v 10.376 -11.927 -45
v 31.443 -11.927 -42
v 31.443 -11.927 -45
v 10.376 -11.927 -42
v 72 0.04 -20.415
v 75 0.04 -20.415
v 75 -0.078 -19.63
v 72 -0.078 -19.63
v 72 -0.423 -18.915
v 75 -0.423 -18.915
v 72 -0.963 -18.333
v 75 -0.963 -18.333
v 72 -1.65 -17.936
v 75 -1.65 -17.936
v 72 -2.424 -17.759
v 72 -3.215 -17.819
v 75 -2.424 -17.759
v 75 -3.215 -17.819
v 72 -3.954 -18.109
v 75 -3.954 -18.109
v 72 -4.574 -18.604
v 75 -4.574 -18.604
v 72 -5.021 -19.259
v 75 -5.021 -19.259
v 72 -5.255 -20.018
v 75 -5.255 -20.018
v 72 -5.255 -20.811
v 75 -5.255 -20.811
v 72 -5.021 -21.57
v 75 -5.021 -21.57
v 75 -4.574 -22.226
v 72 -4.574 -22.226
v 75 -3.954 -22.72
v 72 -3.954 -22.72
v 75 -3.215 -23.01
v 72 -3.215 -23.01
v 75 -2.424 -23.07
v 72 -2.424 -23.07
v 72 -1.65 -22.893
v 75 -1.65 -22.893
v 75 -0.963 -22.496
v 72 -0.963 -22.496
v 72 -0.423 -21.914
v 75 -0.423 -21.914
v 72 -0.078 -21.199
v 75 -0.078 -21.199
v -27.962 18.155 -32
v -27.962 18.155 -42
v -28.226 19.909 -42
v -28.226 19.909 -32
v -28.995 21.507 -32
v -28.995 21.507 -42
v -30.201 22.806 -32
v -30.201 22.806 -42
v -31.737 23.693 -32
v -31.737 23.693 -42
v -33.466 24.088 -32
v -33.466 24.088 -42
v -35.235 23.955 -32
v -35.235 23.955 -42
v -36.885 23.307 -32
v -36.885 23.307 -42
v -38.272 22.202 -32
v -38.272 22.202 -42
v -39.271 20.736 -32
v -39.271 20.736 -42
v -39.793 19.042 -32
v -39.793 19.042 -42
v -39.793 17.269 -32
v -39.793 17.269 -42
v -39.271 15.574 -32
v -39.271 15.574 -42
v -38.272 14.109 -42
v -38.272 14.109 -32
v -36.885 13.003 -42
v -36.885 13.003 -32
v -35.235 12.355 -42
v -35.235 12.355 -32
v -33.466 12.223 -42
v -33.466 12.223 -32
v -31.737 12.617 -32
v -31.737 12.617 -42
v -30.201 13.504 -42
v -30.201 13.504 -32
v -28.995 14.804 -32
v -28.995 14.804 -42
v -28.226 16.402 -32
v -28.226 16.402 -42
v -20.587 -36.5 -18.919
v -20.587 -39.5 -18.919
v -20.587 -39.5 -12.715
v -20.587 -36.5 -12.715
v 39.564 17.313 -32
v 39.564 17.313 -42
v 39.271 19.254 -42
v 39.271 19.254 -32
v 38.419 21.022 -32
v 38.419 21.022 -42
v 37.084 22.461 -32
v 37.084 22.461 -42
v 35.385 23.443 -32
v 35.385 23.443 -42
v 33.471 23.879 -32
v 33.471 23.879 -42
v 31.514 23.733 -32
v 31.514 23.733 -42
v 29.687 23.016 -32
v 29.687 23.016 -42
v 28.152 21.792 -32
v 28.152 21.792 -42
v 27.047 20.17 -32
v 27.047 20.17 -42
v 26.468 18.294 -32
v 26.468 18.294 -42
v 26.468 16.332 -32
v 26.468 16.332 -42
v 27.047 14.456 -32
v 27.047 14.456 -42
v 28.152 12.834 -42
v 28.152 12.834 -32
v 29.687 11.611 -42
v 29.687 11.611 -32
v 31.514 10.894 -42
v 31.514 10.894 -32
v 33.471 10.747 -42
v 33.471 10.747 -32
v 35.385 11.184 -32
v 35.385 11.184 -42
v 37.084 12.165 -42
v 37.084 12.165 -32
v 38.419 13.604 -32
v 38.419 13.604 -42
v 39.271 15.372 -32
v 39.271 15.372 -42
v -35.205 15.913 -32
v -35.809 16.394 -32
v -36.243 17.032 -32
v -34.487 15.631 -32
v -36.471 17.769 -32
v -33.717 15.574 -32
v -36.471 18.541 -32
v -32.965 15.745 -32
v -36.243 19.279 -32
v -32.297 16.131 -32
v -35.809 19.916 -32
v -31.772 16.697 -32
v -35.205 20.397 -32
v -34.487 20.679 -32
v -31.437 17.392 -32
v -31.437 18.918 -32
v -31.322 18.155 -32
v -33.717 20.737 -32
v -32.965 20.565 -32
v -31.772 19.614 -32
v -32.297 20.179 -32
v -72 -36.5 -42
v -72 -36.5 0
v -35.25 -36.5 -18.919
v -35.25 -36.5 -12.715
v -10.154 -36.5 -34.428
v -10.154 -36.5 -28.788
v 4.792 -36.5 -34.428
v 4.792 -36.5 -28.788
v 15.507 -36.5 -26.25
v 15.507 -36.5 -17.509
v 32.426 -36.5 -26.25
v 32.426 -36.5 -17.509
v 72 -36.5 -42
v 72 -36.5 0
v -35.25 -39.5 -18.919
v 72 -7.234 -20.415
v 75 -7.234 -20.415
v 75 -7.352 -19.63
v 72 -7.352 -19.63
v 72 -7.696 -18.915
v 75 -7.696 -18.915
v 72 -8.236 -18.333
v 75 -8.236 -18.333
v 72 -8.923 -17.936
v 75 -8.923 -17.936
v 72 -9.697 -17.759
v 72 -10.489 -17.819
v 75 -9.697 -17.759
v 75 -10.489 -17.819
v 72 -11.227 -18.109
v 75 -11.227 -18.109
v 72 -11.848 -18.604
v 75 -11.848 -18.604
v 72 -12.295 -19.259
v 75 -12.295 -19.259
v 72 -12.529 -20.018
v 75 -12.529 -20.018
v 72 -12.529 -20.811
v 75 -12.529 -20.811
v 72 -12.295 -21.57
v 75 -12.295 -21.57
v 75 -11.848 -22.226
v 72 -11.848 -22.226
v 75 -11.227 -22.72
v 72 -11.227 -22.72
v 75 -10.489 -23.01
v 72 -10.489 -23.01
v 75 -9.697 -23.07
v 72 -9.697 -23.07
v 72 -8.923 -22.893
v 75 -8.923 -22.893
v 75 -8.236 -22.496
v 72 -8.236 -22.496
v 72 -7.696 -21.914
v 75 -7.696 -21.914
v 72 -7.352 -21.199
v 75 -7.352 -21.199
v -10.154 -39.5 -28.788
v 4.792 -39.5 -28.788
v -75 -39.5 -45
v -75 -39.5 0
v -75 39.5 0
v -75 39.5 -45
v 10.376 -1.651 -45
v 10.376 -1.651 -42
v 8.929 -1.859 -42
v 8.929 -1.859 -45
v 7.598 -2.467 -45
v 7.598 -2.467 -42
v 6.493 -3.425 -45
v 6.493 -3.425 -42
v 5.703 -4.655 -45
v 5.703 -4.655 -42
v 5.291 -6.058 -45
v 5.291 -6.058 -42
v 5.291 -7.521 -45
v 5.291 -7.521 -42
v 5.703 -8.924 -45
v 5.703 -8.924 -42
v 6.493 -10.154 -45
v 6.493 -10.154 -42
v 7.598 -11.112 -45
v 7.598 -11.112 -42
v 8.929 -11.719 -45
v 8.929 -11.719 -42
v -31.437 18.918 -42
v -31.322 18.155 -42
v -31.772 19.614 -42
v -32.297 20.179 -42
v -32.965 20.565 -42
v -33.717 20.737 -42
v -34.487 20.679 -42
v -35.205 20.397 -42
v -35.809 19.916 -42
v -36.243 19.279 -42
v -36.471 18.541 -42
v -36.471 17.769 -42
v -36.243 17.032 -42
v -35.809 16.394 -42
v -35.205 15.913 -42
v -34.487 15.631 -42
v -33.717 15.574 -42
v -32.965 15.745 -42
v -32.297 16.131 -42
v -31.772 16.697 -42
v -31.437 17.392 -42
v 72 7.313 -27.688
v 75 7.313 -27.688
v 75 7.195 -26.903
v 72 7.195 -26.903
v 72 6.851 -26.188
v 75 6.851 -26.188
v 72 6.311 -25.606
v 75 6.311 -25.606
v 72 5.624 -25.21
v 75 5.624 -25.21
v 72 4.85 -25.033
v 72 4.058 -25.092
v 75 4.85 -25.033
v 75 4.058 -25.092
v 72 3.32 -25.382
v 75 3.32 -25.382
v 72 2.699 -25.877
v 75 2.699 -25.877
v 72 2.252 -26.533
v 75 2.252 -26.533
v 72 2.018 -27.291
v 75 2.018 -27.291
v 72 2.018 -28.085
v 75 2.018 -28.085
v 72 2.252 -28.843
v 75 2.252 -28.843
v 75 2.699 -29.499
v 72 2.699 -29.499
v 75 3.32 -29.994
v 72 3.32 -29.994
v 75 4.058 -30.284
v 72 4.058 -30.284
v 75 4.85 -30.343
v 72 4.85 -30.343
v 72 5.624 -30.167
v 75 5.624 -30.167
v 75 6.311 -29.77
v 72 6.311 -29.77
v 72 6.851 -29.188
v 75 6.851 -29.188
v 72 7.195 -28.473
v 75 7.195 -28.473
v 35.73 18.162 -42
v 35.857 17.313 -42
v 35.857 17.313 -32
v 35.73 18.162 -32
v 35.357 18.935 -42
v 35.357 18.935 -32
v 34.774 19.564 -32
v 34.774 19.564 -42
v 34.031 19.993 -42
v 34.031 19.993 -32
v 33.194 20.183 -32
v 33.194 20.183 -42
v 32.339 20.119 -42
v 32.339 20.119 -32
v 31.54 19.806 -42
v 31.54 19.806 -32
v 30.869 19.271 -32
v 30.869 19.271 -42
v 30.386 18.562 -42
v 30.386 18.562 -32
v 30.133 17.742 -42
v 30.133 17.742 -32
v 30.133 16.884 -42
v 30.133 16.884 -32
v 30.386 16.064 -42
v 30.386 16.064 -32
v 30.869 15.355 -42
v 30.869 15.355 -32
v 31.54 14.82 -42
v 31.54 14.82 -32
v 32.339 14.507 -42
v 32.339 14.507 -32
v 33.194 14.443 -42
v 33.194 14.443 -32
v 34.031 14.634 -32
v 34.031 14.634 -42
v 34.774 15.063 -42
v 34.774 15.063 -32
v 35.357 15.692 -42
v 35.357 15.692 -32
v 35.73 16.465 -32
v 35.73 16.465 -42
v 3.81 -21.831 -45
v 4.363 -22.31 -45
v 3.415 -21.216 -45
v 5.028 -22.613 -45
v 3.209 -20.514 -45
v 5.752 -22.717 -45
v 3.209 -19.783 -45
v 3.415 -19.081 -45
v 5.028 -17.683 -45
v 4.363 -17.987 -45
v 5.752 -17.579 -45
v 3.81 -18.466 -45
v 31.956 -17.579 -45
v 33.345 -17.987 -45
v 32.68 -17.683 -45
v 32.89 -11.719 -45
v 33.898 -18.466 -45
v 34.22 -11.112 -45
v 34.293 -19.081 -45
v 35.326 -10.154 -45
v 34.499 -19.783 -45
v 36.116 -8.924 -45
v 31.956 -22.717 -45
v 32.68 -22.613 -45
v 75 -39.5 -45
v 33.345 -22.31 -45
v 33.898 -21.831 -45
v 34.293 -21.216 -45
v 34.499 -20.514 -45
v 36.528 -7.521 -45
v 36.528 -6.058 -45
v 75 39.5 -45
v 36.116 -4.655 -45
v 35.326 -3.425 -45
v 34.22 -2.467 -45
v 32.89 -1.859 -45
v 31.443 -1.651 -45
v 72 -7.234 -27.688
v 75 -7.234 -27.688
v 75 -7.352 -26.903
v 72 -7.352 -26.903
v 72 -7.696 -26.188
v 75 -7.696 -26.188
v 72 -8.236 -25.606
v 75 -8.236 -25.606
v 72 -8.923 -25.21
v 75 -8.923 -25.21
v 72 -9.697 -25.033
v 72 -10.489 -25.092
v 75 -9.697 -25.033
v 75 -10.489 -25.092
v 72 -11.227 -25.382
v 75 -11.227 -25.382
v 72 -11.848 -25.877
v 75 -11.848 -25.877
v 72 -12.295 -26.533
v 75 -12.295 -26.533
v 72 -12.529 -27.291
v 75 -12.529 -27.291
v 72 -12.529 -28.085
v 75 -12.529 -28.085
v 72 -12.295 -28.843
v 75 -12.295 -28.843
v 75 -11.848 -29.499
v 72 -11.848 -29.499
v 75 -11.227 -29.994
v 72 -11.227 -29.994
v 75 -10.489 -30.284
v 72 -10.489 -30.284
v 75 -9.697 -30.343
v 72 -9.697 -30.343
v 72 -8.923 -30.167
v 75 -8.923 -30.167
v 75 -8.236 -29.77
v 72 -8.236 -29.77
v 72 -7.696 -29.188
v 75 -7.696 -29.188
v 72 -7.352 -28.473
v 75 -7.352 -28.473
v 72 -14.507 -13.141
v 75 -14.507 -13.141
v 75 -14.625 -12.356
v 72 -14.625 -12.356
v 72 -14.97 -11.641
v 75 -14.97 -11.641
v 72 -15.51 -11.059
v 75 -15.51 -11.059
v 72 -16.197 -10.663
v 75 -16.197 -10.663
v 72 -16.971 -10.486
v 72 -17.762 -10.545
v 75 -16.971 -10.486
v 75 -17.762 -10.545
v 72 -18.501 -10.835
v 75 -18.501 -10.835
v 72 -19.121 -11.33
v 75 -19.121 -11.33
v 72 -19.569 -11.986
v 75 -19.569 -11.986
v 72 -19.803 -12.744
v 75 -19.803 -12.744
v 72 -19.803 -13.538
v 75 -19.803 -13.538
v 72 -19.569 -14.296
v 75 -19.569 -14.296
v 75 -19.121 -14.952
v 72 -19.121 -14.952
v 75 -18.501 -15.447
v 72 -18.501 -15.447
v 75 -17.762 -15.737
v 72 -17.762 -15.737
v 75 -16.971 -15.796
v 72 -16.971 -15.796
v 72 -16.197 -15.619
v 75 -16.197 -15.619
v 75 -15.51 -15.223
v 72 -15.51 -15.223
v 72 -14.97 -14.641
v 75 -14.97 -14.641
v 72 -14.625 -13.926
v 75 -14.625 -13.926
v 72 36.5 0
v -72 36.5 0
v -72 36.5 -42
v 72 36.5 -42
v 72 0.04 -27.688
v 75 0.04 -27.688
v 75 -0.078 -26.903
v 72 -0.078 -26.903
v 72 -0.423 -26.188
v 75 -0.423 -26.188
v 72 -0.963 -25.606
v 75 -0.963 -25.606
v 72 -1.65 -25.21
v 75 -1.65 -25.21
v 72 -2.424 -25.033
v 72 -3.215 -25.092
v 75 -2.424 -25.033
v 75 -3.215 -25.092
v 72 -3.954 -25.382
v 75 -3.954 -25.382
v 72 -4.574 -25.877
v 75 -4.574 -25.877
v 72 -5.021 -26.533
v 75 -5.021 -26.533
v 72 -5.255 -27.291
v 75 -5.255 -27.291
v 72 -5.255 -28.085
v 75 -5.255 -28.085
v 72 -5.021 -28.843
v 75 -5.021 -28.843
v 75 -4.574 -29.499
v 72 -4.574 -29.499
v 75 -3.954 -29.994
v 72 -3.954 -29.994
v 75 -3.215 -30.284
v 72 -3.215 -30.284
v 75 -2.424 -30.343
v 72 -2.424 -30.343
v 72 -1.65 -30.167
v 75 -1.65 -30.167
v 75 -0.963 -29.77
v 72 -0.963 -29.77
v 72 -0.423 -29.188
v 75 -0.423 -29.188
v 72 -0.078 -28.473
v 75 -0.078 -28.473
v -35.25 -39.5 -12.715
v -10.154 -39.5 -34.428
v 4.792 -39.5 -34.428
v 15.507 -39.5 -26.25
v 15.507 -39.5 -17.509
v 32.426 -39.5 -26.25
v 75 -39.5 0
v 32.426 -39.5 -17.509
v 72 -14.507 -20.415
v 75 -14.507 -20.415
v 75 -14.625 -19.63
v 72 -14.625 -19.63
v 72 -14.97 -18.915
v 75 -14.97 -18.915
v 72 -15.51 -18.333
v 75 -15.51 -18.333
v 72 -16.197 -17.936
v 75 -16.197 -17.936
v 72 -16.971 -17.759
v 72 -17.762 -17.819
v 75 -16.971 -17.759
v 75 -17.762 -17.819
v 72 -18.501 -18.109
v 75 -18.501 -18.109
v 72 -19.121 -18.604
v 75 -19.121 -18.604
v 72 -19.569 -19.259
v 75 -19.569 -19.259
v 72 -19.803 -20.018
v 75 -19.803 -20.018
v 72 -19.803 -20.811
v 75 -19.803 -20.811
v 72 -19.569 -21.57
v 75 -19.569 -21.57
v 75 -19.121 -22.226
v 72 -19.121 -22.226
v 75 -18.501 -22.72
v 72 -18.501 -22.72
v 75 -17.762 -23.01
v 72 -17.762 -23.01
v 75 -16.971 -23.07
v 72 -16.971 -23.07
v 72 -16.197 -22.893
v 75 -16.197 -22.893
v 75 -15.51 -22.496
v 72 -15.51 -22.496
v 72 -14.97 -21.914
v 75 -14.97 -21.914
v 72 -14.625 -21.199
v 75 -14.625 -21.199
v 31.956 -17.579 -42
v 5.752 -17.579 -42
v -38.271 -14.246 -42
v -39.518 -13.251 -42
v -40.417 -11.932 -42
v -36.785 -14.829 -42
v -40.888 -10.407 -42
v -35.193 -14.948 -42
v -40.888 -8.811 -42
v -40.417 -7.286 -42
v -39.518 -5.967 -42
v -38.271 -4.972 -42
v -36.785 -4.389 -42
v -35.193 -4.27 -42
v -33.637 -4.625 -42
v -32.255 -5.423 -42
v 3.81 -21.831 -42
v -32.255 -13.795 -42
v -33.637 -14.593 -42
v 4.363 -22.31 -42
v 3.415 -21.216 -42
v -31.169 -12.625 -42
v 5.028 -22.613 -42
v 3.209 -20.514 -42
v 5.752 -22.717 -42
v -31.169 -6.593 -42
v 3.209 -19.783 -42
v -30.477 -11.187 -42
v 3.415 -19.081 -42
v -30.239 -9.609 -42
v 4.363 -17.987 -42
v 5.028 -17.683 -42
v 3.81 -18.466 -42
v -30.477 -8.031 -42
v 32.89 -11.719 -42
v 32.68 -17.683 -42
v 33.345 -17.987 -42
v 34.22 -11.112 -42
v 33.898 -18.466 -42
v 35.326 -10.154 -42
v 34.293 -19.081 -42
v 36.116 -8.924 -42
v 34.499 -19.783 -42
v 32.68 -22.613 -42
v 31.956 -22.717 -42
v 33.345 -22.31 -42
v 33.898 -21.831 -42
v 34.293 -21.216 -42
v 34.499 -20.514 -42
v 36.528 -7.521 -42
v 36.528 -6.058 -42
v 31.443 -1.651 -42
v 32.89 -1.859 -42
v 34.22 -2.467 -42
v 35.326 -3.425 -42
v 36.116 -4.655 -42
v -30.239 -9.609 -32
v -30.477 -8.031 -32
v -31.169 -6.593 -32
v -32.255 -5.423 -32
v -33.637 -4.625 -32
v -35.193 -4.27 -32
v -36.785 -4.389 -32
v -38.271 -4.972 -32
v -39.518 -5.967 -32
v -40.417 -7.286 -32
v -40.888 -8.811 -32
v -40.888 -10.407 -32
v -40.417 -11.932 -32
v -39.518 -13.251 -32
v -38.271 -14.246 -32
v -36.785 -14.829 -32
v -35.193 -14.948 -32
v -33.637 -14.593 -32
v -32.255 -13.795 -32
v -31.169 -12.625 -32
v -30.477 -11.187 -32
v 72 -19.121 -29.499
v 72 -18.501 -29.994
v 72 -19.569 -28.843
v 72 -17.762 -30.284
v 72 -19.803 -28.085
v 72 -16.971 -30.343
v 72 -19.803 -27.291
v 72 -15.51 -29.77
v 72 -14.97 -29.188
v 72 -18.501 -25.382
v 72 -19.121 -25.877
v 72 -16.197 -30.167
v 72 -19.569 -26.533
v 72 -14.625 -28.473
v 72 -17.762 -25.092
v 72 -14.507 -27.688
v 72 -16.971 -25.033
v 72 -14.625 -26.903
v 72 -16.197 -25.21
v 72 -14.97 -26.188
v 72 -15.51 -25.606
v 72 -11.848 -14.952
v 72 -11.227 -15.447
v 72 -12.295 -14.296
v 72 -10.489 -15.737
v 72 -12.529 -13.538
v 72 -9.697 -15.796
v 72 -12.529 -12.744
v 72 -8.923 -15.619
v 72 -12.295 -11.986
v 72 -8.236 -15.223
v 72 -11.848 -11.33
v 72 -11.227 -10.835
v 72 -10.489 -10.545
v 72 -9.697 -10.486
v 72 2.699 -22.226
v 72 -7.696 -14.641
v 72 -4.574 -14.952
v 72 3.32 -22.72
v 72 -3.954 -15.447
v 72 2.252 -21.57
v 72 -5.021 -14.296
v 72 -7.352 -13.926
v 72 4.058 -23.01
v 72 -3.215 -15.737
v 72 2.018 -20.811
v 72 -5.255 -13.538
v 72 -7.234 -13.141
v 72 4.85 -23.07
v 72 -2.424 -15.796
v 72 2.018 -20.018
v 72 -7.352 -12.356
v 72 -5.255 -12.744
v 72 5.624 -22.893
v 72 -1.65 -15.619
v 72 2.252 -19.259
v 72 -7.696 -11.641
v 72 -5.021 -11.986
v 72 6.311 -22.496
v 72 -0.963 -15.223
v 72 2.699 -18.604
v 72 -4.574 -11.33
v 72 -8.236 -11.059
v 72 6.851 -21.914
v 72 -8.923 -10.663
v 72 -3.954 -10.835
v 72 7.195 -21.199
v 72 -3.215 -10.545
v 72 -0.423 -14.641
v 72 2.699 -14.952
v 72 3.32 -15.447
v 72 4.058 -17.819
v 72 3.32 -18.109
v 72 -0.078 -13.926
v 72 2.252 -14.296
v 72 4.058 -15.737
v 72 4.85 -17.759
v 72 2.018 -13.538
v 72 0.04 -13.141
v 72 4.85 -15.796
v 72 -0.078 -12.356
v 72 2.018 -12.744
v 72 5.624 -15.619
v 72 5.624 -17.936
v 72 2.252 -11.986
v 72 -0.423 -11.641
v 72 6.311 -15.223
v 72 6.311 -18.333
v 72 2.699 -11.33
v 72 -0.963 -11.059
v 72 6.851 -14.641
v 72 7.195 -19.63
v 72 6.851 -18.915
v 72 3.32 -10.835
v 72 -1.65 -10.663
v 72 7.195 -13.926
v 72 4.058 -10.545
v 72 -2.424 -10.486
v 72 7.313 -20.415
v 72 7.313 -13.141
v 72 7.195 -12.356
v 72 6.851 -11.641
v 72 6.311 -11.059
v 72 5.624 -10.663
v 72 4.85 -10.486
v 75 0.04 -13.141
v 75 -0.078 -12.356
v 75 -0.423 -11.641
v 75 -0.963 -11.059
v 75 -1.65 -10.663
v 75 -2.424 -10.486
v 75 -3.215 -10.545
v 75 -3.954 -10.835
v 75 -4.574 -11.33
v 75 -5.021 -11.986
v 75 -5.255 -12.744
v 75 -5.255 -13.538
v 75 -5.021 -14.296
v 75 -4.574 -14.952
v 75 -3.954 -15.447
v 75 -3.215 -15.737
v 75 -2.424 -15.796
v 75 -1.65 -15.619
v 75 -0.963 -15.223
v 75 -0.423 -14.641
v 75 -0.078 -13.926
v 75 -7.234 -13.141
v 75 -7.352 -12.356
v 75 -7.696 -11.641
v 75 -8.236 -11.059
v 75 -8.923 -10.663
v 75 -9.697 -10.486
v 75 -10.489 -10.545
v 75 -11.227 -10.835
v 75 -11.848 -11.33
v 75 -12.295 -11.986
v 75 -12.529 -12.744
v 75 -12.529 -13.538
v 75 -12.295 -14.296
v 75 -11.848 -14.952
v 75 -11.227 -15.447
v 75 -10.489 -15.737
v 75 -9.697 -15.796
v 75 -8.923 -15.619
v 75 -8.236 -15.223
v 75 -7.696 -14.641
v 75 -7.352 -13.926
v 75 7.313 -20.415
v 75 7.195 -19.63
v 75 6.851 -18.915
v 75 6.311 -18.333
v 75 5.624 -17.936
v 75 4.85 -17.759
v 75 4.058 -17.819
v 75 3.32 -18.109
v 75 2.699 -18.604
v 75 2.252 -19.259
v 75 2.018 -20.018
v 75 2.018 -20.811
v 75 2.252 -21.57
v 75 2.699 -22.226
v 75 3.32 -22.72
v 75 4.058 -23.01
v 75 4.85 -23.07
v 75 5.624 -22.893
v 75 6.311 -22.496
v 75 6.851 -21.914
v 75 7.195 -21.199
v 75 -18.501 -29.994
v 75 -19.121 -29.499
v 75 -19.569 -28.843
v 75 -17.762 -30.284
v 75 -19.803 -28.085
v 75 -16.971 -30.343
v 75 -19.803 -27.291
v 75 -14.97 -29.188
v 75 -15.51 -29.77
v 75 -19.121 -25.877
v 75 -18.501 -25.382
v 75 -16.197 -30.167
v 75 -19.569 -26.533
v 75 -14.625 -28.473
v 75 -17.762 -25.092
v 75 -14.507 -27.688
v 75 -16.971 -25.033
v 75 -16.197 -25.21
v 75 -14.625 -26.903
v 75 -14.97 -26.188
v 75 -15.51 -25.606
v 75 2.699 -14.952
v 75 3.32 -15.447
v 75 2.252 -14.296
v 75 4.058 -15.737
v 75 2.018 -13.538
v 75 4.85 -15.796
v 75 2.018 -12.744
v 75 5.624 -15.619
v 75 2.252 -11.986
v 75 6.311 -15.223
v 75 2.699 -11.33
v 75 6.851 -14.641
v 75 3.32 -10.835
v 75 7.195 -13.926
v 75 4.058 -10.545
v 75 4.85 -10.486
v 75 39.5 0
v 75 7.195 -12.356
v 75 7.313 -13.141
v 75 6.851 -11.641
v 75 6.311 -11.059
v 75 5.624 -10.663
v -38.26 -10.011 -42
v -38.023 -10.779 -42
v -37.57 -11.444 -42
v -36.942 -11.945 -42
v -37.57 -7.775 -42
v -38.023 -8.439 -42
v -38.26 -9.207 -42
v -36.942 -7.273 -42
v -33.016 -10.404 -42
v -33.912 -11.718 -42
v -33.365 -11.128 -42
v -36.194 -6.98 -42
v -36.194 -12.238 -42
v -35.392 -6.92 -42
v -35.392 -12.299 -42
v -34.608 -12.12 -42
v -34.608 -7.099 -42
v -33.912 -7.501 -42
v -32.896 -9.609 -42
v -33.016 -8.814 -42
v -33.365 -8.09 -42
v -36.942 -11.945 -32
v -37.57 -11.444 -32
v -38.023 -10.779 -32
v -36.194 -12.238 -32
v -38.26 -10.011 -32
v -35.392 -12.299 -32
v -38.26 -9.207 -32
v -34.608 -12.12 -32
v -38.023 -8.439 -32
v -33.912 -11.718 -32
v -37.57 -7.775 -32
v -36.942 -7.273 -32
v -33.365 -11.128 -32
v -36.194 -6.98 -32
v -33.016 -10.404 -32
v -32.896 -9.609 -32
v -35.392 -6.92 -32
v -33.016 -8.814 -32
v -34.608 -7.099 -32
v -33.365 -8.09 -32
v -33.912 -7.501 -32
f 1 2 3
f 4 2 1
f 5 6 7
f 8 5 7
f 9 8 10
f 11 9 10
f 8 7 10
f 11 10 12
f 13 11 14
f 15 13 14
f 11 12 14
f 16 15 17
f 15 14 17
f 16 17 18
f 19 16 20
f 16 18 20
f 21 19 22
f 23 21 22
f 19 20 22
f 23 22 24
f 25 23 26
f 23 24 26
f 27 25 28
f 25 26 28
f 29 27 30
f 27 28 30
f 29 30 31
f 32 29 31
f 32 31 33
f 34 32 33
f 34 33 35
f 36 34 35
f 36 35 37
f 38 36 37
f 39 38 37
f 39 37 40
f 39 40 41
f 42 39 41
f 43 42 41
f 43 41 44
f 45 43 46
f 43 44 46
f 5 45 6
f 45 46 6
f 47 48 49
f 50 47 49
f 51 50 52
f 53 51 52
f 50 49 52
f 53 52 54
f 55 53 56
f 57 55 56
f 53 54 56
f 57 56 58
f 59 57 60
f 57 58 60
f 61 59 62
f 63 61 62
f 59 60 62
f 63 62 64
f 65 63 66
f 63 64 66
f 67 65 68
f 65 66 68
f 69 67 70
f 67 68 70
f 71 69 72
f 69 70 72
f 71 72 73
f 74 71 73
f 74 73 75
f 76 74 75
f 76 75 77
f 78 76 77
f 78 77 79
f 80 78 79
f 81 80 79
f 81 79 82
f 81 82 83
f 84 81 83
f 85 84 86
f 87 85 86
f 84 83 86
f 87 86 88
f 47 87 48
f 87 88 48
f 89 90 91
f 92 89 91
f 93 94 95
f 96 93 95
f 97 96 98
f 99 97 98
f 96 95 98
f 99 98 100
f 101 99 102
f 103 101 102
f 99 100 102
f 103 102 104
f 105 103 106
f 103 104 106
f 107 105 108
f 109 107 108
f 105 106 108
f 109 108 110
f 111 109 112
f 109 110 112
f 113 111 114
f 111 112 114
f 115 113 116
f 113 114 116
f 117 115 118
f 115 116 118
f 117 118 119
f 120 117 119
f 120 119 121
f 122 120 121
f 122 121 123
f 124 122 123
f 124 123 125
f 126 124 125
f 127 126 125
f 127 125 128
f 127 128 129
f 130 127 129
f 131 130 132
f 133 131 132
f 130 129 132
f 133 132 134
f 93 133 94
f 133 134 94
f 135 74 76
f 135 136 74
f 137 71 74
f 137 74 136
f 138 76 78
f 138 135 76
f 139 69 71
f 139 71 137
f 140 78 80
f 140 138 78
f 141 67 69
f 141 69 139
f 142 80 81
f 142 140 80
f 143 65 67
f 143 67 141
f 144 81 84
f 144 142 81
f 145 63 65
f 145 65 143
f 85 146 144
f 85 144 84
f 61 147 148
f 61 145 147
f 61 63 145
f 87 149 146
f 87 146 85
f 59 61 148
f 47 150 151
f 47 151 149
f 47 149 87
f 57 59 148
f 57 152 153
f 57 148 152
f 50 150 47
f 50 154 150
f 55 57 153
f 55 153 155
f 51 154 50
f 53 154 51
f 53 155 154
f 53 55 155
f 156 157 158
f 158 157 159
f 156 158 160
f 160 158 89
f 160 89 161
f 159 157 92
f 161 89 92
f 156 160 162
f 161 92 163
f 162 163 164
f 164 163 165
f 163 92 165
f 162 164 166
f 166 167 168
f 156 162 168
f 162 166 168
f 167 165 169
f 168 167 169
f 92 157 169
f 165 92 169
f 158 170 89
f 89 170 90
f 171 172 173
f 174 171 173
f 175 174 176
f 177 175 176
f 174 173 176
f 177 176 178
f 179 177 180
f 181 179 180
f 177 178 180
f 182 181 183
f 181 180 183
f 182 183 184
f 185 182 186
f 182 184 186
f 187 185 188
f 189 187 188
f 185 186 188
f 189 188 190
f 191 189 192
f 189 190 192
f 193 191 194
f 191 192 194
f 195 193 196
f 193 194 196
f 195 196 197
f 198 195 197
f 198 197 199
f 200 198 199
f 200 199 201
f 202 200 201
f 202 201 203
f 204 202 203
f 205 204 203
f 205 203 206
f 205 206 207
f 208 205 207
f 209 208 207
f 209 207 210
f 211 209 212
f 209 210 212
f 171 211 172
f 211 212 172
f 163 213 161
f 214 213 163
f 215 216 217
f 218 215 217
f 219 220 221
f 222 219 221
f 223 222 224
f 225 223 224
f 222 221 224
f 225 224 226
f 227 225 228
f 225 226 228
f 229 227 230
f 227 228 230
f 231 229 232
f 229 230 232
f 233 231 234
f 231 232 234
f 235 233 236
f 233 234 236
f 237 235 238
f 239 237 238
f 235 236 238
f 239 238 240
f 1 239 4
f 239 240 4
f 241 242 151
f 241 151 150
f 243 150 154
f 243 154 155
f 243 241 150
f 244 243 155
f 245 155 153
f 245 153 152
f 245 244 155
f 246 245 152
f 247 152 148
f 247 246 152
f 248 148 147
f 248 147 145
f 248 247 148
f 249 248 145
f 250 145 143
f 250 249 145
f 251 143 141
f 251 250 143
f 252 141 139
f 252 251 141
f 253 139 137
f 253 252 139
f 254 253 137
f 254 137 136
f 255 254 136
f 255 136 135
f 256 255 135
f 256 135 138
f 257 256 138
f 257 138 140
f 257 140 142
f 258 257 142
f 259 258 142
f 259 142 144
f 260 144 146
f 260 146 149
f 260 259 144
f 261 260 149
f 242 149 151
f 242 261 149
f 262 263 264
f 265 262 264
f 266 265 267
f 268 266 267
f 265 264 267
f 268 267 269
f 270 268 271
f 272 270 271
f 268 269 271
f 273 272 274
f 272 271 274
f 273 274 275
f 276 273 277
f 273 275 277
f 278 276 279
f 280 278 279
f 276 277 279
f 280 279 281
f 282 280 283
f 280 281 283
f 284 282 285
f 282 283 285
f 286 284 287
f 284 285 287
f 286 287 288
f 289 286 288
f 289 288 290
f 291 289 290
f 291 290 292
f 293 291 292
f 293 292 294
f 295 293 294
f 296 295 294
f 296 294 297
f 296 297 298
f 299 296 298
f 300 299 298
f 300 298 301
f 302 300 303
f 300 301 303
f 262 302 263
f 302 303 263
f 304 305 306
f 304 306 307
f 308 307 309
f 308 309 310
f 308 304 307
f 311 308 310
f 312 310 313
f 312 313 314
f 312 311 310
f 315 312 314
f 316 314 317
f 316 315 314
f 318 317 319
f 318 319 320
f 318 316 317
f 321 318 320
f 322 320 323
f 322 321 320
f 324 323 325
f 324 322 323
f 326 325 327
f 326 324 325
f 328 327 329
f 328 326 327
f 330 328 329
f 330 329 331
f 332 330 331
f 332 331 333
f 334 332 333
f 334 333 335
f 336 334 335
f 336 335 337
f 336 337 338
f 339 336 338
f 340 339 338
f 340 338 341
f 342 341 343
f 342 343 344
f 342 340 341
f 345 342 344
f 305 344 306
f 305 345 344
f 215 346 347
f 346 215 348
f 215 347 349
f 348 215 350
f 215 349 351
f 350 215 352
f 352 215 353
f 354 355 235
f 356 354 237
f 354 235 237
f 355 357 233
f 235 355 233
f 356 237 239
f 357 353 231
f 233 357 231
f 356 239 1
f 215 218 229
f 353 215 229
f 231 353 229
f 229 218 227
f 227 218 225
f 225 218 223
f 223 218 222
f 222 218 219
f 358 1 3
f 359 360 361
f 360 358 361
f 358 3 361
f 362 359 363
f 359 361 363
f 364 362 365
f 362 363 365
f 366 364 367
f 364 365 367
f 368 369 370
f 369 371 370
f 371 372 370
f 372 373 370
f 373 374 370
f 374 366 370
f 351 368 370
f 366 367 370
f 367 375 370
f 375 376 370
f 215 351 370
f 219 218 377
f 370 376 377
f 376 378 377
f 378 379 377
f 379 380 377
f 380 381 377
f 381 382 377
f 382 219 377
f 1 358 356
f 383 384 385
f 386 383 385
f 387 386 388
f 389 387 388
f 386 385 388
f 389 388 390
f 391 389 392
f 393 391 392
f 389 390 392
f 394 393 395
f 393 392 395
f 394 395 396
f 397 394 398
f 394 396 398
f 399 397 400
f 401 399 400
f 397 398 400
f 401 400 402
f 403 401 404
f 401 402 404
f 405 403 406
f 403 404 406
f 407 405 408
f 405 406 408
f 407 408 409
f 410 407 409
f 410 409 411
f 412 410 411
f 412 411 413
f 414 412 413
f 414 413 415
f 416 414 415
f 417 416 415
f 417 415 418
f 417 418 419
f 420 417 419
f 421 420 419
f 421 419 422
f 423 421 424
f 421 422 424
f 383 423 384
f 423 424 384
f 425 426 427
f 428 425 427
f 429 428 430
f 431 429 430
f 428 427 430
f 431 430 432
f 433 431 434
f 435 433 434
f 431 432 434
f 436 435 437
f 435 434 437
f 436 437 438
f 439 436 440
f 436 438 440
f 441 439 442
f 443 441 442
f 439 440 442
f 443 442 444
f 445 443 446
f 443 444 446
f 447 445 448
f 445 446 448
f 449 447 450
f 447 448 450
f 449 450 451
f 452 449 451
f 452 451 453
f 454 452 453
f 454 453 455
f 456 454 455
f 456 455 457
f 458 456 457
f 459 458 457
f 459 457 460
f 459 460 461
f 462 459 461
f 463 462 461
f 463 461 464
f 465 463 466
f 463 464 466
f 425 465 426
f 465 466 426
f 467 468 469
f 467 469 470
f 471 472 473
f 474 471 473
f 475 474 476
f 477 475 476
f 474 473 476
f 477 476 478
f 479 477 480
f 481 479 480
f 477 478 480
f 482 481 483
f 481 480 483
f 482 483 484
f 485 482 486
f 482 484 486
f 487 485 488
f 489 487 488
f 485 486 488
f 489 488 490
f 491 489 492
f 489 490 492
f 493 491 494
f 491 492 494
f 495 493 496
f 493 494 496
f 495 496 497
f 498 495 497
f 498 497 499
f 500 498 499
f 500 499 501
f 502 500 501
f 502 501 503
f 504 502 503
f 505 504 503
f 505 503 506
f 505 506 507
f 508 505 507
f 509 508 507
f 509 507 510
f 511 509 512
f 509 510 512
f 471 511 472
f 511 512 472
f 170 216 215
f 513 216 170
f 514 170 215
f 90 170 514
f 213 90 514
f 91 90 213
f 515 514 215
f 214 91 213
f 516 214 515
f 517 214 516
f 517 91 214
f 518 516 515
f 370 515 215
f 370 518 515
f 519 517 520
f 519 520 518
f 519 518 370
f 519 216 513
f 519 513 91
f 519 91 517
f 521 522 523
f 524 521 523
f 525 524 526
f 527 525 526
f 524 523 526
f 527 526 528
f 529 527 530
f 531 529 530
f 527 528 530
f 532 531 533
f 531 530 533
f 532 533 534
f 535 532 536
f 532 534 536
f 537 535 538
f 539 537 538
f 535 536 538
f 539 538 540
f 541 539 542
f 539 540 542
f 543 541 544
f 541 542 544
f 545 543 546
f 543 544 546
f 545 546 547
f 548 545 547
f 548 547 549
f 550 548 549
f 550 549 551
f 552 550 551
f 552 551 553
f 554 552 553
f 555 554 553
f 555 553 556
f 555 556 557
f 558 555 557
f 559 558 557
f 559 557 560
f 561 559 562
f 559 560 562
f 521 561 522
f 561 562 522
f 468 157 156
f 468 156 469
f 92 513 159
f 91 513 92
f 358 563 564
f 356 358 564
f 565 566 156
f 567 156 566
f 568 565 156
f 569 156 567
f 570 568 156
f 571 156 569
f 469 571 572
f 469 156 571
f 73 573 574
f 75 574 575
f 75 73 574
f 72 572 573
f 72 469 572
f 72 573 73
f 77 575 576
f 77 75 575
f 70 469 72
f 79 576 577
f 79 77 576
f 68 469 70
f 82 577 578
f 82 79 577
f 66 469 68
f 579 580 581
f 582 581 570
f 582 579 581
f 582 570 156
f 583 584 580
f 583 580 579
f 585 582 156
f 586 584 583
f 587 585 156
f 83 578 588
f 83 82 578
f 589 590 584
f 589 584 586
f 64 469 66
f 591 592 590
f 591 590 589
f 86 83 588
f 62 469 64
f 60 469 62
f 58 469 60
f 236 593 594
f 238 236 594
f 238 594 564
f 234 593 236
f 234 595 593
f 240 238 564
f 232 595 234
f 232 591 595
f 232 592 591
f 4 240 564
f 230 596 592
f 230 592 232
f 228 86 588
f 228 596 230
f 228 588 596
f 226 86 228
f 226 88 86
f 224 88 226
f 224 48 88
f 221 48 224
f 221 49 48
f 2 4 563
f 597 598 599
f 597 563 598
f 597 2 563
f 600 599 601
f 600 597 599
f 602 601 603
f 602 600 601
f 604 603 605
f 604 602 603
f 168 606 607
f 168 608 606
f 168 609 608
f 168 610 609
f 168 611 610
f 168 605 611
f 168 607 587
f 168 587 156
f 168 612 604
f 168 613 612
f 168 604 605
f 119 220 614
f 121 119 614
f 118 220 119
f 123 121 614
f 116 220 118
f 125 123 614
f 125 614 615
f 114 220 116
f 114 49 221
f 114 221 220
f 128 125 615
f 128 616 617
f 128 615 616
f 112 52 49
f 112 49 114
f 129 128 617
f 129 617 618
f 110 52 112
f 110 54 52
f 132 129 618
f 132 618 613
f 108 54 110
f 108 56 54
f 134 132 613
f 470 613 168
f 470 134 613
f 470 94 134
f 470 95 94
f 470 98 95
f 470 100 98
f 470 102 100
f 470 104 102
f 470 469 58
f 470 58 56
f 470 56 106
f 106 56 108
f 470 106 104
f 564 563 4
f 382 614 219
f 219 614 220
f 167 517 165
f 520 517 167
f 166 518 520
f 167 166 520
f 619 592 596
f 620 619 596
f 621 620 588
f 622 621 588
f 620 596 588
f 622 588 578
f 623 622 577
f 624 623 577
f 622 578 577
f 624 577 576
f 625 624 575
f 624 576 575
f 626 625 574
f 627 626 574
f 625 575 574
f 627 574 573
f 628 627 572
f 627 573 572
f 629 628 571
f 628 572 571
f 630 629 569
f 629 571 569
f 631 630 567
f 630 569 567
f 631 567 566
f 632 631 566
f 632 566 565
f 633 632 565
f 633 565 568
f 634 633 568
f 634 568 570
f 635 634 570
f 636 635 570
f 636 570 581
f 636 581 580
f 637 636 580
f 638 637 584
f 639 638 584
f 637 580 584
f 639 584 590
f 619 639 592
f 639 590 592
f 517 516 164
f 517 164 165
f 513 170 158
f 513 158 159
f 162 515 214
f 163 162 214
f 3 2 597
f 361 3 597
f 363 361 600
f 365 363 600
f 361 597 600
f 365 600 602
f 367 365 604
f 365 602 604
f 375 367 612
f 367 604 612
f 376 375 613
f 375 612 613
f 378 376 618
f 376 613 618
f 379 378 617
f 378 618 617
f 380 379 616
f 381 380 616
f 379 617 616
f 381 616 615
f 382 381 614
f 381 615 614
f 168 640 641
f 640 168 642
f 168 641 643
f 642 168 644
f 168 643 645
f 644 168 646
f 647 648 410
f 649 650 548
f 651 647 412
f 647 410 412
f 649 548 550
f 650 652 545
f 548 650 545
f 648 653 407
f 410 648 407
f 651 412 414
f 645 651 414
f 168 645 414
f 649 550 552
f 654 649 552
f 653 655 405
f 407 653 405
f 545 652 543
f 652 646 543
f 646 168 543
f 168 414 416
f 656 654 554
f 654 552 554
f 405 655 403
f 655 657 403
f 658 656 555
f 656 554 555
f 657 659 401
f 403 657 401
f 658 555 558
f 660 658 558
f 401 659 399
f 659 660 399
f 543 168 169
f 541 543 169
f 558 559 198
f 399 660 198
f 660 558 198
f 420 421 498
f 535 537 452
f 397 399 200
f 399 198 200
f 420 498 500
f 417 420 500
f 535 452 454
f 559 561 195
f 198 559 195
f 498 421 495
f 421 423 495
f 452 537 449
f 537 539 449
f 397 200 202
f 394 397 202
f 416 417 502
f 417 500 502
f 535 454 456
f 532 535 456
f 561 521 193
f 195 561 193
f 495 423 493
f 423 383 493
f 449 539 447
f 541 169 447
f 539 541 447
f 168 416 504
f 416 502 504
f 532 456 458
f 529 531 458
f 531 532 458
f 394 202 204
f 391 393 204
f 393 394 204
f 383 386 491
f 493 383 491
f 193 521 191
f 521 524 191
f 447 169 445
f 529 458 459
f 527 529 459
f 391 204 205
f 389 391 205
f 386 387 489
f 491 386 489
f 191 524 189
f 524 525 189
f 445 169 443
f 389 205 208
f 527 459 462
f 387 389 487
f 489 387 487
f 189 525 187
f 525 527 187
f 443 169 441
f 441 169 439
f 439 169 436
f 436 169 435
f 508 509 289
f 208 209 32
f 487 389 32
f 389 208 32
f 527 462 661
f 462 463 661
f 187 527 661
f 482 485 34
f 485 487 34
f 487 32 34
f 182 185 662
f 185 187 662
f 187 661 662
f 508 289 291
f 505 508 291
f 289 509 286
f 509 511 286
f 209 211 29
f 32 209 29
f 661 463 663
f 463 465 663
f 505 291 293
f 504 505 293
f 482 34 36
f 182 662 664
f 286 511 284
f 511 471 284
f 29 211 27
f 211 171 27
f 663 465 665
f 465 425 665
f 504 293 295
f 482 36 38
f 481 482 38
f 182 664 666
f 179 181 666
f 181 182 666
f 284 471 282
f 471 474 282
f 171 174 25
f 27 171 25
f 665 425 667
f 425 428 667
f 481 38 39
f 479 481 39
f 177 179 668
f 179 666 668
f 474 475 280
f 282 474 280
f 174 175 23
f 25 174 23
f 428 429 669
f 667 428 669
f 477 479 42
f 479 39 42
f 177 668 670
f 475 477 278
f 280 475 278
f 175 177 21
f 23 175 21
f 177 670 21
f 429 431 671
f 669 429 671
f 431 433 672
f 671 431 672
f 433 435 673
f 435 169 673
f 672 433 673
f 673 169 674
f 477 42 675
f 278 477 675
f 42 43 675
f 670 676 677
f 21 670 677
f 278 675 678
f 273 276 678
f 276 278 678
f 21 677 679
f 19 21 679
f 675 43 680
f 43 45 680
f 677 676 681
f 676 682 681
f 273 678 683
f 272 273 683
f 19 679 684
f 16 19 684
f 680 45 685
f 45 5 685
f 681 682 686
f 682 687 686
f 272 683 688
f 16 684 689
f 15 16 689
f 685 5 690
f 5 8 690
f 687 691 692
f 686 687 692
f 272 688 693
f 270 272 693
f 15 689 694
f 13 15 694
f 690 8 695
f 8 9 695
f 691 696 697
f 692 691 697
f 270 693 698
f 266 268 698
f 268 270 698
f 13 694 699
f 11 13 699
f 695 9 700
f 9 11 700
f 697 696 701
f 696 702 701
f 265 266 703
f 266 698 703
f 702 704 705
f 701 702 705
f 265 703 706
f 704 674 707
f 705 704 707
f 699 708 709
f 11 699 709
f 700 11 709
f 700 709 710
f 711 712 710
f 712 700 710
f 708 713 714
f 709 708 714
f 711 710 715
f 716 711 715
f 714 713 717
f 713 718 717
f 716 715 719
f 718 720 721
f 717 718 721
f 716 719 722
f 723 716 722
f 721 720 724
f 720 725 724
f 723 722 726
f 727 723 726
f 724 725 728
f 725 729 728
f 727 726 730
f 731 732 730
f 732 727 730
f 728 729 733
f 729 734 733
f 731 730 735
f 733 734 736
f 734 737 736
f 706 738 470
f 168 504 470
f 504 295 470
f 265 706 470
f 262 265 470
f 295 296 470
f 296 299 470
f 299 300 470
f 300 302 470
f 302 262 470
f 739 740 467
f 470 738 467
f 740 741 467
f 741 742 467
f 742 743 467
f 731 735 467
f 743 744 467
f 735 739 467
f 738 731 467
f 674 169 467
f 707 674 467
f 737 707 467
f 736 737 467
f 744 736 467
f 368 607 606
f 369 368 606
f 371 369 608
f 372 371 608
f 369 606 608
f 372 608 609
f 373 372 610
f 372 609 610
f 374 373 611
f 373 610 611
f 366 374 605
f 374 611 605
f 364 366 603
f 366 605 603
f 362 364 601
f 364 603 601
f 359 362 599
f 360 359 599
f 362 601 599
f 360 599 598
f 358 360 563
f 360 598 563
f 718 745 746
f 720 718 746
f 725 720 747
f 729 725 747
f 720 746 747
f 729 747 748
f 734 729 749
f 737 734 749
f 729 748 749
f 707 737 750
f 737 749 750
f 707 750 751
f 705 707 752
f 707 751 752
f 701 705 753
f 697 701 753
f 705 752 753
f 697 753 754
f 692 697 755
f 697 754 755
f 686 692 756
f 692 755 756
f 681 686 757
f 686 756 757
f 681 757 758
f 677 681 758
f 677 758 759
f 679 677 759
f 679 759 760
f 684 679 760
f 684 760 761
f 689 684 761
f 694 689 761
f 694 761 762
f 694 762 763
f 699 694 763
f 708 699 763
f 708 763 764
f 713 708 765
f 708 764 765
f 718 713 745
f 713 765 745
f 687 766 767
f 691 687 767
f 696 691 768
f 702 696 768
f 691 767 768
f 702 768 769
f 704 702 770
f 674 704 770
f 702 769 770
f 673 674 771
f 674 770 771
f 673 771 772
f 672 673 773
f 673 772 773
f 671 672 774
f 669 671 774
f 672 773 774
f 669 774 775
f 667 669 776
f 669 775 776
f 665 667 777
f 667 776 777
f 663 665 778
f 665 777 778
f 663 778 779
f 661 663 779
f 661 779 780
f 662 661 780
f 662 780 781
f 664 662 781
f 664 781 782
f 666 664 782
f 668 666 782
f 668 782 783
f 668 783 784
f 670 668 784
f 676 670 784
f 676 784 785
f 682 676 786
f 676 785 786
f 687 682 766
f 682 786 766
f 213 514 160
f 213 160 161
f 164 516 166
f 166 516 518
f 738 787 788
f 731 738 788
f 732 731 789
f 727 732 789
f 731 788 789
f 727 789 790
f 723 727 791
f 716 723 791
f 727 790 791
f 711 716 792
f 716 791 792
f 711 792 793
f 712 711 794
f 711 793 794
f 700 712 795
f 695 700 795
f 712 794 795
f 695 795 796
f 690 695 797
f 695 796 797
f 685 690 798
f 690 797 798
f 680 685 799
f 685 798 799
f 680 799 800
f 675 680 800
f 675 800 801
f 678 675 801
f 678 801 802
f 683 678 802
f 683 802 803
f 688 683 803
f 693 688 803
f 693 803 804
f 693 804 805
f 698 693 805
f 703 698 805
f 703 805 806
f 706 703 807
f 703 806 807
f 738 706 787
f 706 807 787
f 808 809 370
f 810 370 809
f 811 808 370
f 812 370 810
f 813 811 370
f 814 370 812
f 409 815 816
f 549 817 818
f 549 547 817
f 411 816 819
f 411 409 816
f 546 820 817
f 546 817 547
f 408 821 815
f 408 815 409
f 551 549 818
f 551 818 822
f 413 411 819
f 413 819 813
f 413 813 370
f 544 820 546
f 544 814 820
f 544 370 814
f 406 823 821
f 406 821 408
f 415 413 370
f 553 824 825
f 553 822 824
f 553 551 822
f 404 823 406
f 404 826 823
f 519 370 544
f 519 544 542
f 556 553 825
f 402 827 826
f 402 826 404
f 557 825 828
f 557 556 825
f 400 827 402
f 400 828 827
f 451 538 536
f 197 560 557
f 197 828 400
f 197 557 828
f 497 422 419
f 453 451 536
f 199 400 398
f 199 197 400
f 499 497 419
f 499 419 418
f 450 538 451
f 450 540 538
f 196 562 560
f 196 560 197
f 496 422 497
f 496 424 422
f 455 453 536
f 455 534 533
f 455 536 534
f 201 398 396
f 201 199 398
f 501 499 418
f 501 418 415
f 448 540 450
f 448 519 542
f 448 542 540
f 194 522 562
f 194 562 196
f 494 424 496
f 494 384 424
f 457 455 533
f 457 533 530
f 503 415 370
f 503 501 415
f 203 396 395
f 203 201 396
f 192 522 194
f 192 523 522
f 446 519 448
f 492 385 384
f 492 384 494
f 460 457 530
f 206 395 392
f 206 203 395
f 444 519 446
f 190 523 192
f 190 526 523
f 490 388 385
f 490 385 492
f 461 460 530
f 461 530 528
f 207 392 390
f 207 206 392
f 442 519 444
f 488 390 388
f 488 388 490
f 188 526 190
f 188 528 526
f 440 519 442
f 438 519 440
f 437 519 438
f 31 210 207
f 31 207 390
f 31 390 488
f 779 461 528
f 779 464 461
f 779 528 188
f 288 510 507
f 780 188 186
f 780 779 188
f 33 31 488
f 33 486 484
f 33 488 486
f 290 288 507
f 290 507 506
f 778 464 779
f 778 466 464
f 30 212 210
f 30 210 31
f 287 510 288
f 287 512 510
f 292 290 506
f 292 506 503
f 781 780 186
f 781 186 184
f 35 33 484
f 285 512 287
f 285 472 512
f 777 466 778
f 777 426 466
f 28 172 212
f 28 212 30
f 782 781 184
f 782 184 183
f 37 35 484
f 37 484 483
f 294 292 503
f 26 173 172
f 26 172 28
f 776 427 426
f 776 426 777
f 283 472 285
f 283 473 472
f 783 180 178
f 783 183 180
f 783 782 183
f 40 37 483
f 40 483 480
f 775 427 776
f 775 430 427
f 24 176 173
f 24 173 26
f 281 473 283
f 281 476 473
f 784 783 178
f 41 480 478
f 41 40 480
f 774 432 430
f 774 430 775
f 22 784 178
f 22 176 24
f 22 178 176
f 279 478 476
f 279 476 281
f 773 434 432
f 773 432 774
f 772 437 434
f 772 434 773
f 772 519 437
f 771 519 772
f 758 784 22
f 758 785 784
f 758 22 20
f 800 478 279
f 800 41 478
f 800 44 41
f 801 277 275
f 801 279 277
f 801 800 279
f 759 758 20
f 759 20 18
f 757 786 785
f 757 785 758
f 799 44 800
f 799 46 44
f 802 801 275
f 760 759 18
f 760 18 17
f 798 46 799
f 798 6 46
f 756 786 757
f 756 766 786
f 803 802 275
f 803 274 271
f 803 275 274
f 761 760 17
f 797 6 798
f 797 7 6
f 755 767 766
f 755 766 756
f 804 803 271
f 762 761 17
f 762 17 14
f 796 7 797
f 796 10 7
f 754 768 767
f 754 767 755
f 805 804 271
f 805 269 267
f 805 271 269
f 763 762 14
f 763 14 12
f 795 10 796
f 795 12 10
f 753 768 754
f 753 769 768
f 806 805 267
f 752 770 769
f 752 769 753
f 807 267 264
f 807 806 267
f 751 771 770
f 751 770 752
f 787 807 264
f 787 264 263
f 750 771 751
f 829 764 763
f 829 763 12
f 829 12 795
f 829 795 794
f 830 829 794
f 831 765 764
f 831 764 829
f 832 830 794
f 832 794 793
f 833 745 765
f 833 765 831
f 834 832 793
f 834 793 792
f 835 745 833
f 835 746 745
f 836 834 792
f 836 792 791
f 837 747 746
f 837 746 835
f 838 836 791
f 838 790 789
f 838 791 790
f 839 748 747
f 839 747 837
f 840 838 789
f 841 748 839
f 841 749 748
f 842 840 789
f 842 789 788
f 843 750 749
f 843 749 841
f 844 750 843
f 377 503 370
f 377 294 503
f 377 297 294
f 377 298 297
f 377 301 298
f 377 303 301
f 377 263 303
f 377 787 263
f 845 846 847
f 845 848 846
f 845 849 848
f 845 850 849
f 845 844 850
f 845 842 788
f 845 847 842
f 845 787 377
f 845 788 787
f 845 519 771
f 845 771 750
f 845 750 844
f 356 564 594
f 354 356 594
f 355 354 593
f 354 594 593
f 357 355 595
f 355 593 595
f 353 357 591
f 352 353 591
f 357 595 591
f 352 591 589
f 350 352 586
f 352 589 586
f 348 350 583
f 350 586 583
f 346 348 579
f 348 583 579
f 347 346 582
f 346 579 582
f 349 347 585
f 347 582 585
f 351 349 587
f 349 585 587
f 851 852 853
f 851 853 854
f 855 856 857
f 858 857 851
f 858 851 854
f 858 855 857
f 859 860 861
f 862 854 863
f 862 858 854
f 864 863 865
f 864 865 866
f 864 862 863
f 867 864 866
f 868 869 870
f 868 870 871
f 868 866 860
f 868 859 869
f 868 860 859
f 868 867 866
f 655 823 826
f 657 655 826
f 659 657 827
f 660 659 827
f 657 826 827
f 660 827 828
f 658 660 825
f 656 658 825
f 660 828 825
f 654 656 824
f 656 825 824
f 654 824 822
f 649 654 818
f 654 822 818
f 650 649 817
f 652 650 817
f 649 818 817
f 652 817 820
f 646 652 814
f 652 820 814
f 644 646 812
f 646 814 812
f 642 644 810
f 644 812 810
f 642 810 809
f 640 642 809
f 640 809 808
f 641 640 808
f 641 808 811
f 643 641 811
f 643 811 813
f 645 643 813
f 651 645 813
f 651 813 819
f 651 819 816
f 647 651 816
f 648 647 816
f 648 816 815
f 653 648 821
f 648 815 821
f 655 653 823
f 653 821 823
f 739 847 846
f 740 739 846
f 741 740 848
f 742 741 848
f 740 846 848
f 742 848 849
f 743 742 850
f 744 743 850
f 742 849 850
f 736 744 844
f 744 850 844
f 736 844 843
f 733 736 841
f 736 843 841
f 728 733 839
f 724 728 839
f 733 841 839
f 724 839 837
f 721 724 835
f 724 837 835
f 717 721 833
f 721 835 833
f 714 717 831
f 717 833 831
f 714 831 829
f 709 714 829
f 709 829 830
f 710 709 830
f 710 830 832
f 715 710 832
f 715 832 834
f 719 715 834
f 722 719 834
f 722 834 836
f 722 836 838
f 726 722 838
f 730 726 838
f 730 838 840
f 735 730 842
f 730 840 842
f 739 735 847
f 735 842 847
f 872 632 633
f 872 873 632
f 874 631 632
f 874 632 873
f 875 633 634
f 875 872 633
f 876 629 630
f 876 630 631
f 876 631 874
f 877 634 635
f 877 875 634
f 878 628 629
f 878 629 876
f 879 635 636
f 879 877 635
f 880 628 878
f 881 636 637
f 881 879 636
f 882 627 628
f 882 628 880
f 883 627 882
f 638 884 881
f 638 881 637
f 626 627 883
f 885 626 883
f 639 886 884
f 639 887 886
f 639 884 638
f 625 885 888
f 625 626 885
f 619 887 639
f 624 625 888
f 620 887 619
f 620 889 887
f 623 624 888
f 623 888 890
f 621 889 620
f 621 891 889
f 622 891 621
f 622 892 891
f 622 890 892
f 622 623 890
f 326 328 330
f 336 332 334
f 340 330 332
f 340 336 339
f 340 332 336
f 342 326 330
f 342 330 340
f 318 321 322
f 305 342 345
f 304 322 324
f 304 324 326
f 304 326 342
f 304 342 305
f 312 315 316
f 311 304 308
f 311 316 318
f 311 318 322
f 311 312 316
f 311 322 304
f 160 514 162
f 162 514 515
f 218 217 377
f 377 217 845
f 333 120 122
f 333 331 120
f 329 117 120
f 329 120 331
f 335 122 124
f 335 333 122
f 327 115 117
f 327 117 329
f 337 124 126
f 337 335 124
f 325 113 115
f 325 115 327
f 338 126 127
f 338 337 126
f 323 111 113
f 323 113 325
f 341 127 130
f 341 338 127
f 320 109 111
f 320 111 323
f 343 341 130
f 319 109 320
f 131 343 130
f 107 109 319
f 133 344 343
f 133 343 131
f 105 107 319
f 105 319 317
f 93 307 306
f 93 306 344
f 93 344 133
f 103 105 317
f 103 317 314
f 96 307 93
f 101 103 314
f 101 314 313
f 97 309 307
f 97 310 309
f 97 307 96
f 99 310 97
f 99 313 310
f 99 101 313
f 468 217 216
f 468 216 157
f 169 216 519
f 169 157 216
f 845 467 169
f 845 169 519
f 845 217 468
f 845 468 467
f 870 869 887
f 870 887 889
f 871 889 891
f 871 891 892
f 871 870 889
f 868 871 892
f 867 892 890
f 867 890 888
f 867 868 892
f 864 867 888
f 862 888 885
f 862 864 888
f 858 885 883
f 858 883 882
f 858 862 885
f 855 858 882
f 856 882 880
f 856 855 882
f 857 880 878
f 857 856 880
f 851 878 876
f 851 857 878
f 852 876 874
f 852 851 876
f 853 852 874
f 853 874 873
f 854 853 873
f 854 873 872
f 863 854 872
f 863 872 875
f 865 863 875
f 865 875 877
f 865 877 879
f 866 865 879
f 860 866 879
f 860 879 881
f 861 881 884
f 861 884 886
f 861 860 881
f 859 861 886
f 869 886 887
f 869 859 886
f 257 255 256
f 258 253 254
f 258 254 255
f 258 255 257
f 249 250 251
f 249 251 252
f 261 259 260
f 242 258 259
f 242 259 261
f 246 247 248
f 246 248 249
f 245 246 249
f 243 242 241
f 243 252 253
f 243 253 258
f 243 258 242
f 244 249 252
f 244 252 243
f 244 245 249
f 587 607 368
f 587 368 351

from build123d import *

# Parameters (mm, degrees)
SKETCH_W        = 150
SKETCH_H        = 79
PAD_DEPTH       = 45
SKETCH001_W     = 144
SKETCH001_H     = 73
POCKET_DEPTH    = 42
SKETCH002_W     = 14.663201
SKETCH002_H     = 6.203663
SKETCH002_W_2   = 16.919073
SKETCH002_H_2   = 8.741524
SKETCH002_W_3   = 14.945191
SKETCH002_H_3   = 5.639692
POCKET001_DEPTH = 3
SKETCH003_R     = 5.949199
SKETCH003_R_2   = 2.588926
SKETCH003_R_3   = 5.354286
SKETCH003_R_4   = 2.696955
SKETCH003_R_5   = 6.584553
SKETCH003_R_6   = 2.878425
PAD001_DEPTH    = 10
POCKET002_DEPTH = 3
SKETCH005_R     = 2.662532
POCKET003_DEPTH = 3


with BuildPart() as part:
    # Sketch → Pad (new body)
    with BuildSketch(Plane.XY):
        Rectangle(SKETCH_W, SKETCH_H)
    extrude(amount=-PAD_DEPTH)

    # Sketch001 → Pocket (cut)
    with BuildSketch(Plane.XY):
        Rectangle(SKETCH001_W, SKETCH001_H)
    extrude(amount=-POCKET_DEPTH, mode=Mode.SUBTRACT)

    # Sketch002 (on DatumPlane) → Pocket001 (cut)
    with BuildSketch(Plane.XZ.offset(39.5)):
        with Locations((-27.918567, -15.816674)):
            Rectangle(SKETCH002_W, SKETCH002_H)
        with Locations((23.966603, -21.879343)):
            Rectangle(SKETCH002_W_2, SKETCH002_H_2)
        with Locations((-2.680947, -31.607812)):
            Rectangle(SKETCH002_W_3, SKETCH002_H_3)
    extrude(amount=-POCKET001_DEPTH, mode=Mode.SUBTRACT)

    # Sketch003 (on DatumPlane) → Pad001 (join)
    with BuildSketch(Plane.XY.offset(-42)):
        with Locations((-33.910699, 18.155216)):
            Circle(SKETCH003_R)
        with Locations((-33.910699, 18.155216)):
            Circle(SKETCH003_R_2, mode=Mode.SUBTRACT)
        with Locations((-35.593381, -9.60911)):
            Circle(SKETCH003_R_3)
        with Locations((-35.593381, -9.60911)):
            Circle(SKETCH003_R_4, mode=Mode.SUBTRACT)
        with Locations((32.979031, 17.313114)):
            Circle(SKETCH003_R_5)
        with Locations((32.979031, 17.313114)):
            Circle(SKETCH003_R_6, mode=Mode.SUBTRACT)
    extrude(amount=PAD001_DEPTH)

    # Sketch004 (on DatumPlane) → Pocket002 (cut)
    with BuildSketch(Plane.XY.offset(-42)):
        with BuildLine():
            ThreePointArc((31.442511, -11.927483), (36.580599, -6.789395), (31.442511, -1.651307))
            Line((31.442511, -1.651307), (10.376326, -1.651307))
            ThreePointArc((10.376326, -1.651307), (5.238238, -6.789395), (10.376326, -11.927483))
            Line((31.442511, -11.927483), (10.376326, -11.927483))
        make_face()
        with BuildLine():
            ThreePointArc((31.95632, -22.717489), (34.525381, -20.148428), (31.95632, -17.579367))
            Line((31.95632, -17.579367), (5.752032, -17.579367))
            ThreePointArc((5.752032, -17.579367), (3.182971, -20.148428), (5.752032, -22.717489))
            Line((31.95632, -22.717489), (5.752032, -22.717489))
        make_face()
    extrude(amount=-POCKET002_DEPTH, mode=Mode.SUBTRACT)

    # Sketch005 (on DatumPlane) → Pocket003 (cut)
    with BuildSketch(Plane.YZ.offset(75)):
        with Locations((-17.169722, -13.141008)):
            Circle(SKETCH005_R)
        with Locations((-9.896163, -13.141008)):
            Circle(SKETCH005_R)
        with Locations((-2.622604, -13.141008)):
            Circle(SKETCH005_R)
        with Locations((4.650955, -13.141008)):
            Circle(SKETCH005_R)
        with Locations((-17.169722, -20.414567)):
            Circle(SKETCH005_R)
        with Locations((-9.896163, -20.414567)):
            Circle(SKETCH005_R)
        with Locations((-2.622604, -20.414567)):
            Circle(SKETCH005_R)
        with Locations((4.650955, -20.414567)):
            Circle(SKETCH005_R)
        with Locations((-17.169722, -27.688126)):
            Circle(SKETCH005_R)
        with Locations((-9.896163, -27.688126)):
            Circle(SKETCH005_R)
        with Locations((-2.622604, -27.688126)):
            Circle(SKETCH005_R)
        with Locations((4.650955, -27.688126)):
            Circle(SKETCH005_R)
    extrude(amount=-POCKET003_DEPTH, mode=Mode.SUBTRACT)


solid = part.part
